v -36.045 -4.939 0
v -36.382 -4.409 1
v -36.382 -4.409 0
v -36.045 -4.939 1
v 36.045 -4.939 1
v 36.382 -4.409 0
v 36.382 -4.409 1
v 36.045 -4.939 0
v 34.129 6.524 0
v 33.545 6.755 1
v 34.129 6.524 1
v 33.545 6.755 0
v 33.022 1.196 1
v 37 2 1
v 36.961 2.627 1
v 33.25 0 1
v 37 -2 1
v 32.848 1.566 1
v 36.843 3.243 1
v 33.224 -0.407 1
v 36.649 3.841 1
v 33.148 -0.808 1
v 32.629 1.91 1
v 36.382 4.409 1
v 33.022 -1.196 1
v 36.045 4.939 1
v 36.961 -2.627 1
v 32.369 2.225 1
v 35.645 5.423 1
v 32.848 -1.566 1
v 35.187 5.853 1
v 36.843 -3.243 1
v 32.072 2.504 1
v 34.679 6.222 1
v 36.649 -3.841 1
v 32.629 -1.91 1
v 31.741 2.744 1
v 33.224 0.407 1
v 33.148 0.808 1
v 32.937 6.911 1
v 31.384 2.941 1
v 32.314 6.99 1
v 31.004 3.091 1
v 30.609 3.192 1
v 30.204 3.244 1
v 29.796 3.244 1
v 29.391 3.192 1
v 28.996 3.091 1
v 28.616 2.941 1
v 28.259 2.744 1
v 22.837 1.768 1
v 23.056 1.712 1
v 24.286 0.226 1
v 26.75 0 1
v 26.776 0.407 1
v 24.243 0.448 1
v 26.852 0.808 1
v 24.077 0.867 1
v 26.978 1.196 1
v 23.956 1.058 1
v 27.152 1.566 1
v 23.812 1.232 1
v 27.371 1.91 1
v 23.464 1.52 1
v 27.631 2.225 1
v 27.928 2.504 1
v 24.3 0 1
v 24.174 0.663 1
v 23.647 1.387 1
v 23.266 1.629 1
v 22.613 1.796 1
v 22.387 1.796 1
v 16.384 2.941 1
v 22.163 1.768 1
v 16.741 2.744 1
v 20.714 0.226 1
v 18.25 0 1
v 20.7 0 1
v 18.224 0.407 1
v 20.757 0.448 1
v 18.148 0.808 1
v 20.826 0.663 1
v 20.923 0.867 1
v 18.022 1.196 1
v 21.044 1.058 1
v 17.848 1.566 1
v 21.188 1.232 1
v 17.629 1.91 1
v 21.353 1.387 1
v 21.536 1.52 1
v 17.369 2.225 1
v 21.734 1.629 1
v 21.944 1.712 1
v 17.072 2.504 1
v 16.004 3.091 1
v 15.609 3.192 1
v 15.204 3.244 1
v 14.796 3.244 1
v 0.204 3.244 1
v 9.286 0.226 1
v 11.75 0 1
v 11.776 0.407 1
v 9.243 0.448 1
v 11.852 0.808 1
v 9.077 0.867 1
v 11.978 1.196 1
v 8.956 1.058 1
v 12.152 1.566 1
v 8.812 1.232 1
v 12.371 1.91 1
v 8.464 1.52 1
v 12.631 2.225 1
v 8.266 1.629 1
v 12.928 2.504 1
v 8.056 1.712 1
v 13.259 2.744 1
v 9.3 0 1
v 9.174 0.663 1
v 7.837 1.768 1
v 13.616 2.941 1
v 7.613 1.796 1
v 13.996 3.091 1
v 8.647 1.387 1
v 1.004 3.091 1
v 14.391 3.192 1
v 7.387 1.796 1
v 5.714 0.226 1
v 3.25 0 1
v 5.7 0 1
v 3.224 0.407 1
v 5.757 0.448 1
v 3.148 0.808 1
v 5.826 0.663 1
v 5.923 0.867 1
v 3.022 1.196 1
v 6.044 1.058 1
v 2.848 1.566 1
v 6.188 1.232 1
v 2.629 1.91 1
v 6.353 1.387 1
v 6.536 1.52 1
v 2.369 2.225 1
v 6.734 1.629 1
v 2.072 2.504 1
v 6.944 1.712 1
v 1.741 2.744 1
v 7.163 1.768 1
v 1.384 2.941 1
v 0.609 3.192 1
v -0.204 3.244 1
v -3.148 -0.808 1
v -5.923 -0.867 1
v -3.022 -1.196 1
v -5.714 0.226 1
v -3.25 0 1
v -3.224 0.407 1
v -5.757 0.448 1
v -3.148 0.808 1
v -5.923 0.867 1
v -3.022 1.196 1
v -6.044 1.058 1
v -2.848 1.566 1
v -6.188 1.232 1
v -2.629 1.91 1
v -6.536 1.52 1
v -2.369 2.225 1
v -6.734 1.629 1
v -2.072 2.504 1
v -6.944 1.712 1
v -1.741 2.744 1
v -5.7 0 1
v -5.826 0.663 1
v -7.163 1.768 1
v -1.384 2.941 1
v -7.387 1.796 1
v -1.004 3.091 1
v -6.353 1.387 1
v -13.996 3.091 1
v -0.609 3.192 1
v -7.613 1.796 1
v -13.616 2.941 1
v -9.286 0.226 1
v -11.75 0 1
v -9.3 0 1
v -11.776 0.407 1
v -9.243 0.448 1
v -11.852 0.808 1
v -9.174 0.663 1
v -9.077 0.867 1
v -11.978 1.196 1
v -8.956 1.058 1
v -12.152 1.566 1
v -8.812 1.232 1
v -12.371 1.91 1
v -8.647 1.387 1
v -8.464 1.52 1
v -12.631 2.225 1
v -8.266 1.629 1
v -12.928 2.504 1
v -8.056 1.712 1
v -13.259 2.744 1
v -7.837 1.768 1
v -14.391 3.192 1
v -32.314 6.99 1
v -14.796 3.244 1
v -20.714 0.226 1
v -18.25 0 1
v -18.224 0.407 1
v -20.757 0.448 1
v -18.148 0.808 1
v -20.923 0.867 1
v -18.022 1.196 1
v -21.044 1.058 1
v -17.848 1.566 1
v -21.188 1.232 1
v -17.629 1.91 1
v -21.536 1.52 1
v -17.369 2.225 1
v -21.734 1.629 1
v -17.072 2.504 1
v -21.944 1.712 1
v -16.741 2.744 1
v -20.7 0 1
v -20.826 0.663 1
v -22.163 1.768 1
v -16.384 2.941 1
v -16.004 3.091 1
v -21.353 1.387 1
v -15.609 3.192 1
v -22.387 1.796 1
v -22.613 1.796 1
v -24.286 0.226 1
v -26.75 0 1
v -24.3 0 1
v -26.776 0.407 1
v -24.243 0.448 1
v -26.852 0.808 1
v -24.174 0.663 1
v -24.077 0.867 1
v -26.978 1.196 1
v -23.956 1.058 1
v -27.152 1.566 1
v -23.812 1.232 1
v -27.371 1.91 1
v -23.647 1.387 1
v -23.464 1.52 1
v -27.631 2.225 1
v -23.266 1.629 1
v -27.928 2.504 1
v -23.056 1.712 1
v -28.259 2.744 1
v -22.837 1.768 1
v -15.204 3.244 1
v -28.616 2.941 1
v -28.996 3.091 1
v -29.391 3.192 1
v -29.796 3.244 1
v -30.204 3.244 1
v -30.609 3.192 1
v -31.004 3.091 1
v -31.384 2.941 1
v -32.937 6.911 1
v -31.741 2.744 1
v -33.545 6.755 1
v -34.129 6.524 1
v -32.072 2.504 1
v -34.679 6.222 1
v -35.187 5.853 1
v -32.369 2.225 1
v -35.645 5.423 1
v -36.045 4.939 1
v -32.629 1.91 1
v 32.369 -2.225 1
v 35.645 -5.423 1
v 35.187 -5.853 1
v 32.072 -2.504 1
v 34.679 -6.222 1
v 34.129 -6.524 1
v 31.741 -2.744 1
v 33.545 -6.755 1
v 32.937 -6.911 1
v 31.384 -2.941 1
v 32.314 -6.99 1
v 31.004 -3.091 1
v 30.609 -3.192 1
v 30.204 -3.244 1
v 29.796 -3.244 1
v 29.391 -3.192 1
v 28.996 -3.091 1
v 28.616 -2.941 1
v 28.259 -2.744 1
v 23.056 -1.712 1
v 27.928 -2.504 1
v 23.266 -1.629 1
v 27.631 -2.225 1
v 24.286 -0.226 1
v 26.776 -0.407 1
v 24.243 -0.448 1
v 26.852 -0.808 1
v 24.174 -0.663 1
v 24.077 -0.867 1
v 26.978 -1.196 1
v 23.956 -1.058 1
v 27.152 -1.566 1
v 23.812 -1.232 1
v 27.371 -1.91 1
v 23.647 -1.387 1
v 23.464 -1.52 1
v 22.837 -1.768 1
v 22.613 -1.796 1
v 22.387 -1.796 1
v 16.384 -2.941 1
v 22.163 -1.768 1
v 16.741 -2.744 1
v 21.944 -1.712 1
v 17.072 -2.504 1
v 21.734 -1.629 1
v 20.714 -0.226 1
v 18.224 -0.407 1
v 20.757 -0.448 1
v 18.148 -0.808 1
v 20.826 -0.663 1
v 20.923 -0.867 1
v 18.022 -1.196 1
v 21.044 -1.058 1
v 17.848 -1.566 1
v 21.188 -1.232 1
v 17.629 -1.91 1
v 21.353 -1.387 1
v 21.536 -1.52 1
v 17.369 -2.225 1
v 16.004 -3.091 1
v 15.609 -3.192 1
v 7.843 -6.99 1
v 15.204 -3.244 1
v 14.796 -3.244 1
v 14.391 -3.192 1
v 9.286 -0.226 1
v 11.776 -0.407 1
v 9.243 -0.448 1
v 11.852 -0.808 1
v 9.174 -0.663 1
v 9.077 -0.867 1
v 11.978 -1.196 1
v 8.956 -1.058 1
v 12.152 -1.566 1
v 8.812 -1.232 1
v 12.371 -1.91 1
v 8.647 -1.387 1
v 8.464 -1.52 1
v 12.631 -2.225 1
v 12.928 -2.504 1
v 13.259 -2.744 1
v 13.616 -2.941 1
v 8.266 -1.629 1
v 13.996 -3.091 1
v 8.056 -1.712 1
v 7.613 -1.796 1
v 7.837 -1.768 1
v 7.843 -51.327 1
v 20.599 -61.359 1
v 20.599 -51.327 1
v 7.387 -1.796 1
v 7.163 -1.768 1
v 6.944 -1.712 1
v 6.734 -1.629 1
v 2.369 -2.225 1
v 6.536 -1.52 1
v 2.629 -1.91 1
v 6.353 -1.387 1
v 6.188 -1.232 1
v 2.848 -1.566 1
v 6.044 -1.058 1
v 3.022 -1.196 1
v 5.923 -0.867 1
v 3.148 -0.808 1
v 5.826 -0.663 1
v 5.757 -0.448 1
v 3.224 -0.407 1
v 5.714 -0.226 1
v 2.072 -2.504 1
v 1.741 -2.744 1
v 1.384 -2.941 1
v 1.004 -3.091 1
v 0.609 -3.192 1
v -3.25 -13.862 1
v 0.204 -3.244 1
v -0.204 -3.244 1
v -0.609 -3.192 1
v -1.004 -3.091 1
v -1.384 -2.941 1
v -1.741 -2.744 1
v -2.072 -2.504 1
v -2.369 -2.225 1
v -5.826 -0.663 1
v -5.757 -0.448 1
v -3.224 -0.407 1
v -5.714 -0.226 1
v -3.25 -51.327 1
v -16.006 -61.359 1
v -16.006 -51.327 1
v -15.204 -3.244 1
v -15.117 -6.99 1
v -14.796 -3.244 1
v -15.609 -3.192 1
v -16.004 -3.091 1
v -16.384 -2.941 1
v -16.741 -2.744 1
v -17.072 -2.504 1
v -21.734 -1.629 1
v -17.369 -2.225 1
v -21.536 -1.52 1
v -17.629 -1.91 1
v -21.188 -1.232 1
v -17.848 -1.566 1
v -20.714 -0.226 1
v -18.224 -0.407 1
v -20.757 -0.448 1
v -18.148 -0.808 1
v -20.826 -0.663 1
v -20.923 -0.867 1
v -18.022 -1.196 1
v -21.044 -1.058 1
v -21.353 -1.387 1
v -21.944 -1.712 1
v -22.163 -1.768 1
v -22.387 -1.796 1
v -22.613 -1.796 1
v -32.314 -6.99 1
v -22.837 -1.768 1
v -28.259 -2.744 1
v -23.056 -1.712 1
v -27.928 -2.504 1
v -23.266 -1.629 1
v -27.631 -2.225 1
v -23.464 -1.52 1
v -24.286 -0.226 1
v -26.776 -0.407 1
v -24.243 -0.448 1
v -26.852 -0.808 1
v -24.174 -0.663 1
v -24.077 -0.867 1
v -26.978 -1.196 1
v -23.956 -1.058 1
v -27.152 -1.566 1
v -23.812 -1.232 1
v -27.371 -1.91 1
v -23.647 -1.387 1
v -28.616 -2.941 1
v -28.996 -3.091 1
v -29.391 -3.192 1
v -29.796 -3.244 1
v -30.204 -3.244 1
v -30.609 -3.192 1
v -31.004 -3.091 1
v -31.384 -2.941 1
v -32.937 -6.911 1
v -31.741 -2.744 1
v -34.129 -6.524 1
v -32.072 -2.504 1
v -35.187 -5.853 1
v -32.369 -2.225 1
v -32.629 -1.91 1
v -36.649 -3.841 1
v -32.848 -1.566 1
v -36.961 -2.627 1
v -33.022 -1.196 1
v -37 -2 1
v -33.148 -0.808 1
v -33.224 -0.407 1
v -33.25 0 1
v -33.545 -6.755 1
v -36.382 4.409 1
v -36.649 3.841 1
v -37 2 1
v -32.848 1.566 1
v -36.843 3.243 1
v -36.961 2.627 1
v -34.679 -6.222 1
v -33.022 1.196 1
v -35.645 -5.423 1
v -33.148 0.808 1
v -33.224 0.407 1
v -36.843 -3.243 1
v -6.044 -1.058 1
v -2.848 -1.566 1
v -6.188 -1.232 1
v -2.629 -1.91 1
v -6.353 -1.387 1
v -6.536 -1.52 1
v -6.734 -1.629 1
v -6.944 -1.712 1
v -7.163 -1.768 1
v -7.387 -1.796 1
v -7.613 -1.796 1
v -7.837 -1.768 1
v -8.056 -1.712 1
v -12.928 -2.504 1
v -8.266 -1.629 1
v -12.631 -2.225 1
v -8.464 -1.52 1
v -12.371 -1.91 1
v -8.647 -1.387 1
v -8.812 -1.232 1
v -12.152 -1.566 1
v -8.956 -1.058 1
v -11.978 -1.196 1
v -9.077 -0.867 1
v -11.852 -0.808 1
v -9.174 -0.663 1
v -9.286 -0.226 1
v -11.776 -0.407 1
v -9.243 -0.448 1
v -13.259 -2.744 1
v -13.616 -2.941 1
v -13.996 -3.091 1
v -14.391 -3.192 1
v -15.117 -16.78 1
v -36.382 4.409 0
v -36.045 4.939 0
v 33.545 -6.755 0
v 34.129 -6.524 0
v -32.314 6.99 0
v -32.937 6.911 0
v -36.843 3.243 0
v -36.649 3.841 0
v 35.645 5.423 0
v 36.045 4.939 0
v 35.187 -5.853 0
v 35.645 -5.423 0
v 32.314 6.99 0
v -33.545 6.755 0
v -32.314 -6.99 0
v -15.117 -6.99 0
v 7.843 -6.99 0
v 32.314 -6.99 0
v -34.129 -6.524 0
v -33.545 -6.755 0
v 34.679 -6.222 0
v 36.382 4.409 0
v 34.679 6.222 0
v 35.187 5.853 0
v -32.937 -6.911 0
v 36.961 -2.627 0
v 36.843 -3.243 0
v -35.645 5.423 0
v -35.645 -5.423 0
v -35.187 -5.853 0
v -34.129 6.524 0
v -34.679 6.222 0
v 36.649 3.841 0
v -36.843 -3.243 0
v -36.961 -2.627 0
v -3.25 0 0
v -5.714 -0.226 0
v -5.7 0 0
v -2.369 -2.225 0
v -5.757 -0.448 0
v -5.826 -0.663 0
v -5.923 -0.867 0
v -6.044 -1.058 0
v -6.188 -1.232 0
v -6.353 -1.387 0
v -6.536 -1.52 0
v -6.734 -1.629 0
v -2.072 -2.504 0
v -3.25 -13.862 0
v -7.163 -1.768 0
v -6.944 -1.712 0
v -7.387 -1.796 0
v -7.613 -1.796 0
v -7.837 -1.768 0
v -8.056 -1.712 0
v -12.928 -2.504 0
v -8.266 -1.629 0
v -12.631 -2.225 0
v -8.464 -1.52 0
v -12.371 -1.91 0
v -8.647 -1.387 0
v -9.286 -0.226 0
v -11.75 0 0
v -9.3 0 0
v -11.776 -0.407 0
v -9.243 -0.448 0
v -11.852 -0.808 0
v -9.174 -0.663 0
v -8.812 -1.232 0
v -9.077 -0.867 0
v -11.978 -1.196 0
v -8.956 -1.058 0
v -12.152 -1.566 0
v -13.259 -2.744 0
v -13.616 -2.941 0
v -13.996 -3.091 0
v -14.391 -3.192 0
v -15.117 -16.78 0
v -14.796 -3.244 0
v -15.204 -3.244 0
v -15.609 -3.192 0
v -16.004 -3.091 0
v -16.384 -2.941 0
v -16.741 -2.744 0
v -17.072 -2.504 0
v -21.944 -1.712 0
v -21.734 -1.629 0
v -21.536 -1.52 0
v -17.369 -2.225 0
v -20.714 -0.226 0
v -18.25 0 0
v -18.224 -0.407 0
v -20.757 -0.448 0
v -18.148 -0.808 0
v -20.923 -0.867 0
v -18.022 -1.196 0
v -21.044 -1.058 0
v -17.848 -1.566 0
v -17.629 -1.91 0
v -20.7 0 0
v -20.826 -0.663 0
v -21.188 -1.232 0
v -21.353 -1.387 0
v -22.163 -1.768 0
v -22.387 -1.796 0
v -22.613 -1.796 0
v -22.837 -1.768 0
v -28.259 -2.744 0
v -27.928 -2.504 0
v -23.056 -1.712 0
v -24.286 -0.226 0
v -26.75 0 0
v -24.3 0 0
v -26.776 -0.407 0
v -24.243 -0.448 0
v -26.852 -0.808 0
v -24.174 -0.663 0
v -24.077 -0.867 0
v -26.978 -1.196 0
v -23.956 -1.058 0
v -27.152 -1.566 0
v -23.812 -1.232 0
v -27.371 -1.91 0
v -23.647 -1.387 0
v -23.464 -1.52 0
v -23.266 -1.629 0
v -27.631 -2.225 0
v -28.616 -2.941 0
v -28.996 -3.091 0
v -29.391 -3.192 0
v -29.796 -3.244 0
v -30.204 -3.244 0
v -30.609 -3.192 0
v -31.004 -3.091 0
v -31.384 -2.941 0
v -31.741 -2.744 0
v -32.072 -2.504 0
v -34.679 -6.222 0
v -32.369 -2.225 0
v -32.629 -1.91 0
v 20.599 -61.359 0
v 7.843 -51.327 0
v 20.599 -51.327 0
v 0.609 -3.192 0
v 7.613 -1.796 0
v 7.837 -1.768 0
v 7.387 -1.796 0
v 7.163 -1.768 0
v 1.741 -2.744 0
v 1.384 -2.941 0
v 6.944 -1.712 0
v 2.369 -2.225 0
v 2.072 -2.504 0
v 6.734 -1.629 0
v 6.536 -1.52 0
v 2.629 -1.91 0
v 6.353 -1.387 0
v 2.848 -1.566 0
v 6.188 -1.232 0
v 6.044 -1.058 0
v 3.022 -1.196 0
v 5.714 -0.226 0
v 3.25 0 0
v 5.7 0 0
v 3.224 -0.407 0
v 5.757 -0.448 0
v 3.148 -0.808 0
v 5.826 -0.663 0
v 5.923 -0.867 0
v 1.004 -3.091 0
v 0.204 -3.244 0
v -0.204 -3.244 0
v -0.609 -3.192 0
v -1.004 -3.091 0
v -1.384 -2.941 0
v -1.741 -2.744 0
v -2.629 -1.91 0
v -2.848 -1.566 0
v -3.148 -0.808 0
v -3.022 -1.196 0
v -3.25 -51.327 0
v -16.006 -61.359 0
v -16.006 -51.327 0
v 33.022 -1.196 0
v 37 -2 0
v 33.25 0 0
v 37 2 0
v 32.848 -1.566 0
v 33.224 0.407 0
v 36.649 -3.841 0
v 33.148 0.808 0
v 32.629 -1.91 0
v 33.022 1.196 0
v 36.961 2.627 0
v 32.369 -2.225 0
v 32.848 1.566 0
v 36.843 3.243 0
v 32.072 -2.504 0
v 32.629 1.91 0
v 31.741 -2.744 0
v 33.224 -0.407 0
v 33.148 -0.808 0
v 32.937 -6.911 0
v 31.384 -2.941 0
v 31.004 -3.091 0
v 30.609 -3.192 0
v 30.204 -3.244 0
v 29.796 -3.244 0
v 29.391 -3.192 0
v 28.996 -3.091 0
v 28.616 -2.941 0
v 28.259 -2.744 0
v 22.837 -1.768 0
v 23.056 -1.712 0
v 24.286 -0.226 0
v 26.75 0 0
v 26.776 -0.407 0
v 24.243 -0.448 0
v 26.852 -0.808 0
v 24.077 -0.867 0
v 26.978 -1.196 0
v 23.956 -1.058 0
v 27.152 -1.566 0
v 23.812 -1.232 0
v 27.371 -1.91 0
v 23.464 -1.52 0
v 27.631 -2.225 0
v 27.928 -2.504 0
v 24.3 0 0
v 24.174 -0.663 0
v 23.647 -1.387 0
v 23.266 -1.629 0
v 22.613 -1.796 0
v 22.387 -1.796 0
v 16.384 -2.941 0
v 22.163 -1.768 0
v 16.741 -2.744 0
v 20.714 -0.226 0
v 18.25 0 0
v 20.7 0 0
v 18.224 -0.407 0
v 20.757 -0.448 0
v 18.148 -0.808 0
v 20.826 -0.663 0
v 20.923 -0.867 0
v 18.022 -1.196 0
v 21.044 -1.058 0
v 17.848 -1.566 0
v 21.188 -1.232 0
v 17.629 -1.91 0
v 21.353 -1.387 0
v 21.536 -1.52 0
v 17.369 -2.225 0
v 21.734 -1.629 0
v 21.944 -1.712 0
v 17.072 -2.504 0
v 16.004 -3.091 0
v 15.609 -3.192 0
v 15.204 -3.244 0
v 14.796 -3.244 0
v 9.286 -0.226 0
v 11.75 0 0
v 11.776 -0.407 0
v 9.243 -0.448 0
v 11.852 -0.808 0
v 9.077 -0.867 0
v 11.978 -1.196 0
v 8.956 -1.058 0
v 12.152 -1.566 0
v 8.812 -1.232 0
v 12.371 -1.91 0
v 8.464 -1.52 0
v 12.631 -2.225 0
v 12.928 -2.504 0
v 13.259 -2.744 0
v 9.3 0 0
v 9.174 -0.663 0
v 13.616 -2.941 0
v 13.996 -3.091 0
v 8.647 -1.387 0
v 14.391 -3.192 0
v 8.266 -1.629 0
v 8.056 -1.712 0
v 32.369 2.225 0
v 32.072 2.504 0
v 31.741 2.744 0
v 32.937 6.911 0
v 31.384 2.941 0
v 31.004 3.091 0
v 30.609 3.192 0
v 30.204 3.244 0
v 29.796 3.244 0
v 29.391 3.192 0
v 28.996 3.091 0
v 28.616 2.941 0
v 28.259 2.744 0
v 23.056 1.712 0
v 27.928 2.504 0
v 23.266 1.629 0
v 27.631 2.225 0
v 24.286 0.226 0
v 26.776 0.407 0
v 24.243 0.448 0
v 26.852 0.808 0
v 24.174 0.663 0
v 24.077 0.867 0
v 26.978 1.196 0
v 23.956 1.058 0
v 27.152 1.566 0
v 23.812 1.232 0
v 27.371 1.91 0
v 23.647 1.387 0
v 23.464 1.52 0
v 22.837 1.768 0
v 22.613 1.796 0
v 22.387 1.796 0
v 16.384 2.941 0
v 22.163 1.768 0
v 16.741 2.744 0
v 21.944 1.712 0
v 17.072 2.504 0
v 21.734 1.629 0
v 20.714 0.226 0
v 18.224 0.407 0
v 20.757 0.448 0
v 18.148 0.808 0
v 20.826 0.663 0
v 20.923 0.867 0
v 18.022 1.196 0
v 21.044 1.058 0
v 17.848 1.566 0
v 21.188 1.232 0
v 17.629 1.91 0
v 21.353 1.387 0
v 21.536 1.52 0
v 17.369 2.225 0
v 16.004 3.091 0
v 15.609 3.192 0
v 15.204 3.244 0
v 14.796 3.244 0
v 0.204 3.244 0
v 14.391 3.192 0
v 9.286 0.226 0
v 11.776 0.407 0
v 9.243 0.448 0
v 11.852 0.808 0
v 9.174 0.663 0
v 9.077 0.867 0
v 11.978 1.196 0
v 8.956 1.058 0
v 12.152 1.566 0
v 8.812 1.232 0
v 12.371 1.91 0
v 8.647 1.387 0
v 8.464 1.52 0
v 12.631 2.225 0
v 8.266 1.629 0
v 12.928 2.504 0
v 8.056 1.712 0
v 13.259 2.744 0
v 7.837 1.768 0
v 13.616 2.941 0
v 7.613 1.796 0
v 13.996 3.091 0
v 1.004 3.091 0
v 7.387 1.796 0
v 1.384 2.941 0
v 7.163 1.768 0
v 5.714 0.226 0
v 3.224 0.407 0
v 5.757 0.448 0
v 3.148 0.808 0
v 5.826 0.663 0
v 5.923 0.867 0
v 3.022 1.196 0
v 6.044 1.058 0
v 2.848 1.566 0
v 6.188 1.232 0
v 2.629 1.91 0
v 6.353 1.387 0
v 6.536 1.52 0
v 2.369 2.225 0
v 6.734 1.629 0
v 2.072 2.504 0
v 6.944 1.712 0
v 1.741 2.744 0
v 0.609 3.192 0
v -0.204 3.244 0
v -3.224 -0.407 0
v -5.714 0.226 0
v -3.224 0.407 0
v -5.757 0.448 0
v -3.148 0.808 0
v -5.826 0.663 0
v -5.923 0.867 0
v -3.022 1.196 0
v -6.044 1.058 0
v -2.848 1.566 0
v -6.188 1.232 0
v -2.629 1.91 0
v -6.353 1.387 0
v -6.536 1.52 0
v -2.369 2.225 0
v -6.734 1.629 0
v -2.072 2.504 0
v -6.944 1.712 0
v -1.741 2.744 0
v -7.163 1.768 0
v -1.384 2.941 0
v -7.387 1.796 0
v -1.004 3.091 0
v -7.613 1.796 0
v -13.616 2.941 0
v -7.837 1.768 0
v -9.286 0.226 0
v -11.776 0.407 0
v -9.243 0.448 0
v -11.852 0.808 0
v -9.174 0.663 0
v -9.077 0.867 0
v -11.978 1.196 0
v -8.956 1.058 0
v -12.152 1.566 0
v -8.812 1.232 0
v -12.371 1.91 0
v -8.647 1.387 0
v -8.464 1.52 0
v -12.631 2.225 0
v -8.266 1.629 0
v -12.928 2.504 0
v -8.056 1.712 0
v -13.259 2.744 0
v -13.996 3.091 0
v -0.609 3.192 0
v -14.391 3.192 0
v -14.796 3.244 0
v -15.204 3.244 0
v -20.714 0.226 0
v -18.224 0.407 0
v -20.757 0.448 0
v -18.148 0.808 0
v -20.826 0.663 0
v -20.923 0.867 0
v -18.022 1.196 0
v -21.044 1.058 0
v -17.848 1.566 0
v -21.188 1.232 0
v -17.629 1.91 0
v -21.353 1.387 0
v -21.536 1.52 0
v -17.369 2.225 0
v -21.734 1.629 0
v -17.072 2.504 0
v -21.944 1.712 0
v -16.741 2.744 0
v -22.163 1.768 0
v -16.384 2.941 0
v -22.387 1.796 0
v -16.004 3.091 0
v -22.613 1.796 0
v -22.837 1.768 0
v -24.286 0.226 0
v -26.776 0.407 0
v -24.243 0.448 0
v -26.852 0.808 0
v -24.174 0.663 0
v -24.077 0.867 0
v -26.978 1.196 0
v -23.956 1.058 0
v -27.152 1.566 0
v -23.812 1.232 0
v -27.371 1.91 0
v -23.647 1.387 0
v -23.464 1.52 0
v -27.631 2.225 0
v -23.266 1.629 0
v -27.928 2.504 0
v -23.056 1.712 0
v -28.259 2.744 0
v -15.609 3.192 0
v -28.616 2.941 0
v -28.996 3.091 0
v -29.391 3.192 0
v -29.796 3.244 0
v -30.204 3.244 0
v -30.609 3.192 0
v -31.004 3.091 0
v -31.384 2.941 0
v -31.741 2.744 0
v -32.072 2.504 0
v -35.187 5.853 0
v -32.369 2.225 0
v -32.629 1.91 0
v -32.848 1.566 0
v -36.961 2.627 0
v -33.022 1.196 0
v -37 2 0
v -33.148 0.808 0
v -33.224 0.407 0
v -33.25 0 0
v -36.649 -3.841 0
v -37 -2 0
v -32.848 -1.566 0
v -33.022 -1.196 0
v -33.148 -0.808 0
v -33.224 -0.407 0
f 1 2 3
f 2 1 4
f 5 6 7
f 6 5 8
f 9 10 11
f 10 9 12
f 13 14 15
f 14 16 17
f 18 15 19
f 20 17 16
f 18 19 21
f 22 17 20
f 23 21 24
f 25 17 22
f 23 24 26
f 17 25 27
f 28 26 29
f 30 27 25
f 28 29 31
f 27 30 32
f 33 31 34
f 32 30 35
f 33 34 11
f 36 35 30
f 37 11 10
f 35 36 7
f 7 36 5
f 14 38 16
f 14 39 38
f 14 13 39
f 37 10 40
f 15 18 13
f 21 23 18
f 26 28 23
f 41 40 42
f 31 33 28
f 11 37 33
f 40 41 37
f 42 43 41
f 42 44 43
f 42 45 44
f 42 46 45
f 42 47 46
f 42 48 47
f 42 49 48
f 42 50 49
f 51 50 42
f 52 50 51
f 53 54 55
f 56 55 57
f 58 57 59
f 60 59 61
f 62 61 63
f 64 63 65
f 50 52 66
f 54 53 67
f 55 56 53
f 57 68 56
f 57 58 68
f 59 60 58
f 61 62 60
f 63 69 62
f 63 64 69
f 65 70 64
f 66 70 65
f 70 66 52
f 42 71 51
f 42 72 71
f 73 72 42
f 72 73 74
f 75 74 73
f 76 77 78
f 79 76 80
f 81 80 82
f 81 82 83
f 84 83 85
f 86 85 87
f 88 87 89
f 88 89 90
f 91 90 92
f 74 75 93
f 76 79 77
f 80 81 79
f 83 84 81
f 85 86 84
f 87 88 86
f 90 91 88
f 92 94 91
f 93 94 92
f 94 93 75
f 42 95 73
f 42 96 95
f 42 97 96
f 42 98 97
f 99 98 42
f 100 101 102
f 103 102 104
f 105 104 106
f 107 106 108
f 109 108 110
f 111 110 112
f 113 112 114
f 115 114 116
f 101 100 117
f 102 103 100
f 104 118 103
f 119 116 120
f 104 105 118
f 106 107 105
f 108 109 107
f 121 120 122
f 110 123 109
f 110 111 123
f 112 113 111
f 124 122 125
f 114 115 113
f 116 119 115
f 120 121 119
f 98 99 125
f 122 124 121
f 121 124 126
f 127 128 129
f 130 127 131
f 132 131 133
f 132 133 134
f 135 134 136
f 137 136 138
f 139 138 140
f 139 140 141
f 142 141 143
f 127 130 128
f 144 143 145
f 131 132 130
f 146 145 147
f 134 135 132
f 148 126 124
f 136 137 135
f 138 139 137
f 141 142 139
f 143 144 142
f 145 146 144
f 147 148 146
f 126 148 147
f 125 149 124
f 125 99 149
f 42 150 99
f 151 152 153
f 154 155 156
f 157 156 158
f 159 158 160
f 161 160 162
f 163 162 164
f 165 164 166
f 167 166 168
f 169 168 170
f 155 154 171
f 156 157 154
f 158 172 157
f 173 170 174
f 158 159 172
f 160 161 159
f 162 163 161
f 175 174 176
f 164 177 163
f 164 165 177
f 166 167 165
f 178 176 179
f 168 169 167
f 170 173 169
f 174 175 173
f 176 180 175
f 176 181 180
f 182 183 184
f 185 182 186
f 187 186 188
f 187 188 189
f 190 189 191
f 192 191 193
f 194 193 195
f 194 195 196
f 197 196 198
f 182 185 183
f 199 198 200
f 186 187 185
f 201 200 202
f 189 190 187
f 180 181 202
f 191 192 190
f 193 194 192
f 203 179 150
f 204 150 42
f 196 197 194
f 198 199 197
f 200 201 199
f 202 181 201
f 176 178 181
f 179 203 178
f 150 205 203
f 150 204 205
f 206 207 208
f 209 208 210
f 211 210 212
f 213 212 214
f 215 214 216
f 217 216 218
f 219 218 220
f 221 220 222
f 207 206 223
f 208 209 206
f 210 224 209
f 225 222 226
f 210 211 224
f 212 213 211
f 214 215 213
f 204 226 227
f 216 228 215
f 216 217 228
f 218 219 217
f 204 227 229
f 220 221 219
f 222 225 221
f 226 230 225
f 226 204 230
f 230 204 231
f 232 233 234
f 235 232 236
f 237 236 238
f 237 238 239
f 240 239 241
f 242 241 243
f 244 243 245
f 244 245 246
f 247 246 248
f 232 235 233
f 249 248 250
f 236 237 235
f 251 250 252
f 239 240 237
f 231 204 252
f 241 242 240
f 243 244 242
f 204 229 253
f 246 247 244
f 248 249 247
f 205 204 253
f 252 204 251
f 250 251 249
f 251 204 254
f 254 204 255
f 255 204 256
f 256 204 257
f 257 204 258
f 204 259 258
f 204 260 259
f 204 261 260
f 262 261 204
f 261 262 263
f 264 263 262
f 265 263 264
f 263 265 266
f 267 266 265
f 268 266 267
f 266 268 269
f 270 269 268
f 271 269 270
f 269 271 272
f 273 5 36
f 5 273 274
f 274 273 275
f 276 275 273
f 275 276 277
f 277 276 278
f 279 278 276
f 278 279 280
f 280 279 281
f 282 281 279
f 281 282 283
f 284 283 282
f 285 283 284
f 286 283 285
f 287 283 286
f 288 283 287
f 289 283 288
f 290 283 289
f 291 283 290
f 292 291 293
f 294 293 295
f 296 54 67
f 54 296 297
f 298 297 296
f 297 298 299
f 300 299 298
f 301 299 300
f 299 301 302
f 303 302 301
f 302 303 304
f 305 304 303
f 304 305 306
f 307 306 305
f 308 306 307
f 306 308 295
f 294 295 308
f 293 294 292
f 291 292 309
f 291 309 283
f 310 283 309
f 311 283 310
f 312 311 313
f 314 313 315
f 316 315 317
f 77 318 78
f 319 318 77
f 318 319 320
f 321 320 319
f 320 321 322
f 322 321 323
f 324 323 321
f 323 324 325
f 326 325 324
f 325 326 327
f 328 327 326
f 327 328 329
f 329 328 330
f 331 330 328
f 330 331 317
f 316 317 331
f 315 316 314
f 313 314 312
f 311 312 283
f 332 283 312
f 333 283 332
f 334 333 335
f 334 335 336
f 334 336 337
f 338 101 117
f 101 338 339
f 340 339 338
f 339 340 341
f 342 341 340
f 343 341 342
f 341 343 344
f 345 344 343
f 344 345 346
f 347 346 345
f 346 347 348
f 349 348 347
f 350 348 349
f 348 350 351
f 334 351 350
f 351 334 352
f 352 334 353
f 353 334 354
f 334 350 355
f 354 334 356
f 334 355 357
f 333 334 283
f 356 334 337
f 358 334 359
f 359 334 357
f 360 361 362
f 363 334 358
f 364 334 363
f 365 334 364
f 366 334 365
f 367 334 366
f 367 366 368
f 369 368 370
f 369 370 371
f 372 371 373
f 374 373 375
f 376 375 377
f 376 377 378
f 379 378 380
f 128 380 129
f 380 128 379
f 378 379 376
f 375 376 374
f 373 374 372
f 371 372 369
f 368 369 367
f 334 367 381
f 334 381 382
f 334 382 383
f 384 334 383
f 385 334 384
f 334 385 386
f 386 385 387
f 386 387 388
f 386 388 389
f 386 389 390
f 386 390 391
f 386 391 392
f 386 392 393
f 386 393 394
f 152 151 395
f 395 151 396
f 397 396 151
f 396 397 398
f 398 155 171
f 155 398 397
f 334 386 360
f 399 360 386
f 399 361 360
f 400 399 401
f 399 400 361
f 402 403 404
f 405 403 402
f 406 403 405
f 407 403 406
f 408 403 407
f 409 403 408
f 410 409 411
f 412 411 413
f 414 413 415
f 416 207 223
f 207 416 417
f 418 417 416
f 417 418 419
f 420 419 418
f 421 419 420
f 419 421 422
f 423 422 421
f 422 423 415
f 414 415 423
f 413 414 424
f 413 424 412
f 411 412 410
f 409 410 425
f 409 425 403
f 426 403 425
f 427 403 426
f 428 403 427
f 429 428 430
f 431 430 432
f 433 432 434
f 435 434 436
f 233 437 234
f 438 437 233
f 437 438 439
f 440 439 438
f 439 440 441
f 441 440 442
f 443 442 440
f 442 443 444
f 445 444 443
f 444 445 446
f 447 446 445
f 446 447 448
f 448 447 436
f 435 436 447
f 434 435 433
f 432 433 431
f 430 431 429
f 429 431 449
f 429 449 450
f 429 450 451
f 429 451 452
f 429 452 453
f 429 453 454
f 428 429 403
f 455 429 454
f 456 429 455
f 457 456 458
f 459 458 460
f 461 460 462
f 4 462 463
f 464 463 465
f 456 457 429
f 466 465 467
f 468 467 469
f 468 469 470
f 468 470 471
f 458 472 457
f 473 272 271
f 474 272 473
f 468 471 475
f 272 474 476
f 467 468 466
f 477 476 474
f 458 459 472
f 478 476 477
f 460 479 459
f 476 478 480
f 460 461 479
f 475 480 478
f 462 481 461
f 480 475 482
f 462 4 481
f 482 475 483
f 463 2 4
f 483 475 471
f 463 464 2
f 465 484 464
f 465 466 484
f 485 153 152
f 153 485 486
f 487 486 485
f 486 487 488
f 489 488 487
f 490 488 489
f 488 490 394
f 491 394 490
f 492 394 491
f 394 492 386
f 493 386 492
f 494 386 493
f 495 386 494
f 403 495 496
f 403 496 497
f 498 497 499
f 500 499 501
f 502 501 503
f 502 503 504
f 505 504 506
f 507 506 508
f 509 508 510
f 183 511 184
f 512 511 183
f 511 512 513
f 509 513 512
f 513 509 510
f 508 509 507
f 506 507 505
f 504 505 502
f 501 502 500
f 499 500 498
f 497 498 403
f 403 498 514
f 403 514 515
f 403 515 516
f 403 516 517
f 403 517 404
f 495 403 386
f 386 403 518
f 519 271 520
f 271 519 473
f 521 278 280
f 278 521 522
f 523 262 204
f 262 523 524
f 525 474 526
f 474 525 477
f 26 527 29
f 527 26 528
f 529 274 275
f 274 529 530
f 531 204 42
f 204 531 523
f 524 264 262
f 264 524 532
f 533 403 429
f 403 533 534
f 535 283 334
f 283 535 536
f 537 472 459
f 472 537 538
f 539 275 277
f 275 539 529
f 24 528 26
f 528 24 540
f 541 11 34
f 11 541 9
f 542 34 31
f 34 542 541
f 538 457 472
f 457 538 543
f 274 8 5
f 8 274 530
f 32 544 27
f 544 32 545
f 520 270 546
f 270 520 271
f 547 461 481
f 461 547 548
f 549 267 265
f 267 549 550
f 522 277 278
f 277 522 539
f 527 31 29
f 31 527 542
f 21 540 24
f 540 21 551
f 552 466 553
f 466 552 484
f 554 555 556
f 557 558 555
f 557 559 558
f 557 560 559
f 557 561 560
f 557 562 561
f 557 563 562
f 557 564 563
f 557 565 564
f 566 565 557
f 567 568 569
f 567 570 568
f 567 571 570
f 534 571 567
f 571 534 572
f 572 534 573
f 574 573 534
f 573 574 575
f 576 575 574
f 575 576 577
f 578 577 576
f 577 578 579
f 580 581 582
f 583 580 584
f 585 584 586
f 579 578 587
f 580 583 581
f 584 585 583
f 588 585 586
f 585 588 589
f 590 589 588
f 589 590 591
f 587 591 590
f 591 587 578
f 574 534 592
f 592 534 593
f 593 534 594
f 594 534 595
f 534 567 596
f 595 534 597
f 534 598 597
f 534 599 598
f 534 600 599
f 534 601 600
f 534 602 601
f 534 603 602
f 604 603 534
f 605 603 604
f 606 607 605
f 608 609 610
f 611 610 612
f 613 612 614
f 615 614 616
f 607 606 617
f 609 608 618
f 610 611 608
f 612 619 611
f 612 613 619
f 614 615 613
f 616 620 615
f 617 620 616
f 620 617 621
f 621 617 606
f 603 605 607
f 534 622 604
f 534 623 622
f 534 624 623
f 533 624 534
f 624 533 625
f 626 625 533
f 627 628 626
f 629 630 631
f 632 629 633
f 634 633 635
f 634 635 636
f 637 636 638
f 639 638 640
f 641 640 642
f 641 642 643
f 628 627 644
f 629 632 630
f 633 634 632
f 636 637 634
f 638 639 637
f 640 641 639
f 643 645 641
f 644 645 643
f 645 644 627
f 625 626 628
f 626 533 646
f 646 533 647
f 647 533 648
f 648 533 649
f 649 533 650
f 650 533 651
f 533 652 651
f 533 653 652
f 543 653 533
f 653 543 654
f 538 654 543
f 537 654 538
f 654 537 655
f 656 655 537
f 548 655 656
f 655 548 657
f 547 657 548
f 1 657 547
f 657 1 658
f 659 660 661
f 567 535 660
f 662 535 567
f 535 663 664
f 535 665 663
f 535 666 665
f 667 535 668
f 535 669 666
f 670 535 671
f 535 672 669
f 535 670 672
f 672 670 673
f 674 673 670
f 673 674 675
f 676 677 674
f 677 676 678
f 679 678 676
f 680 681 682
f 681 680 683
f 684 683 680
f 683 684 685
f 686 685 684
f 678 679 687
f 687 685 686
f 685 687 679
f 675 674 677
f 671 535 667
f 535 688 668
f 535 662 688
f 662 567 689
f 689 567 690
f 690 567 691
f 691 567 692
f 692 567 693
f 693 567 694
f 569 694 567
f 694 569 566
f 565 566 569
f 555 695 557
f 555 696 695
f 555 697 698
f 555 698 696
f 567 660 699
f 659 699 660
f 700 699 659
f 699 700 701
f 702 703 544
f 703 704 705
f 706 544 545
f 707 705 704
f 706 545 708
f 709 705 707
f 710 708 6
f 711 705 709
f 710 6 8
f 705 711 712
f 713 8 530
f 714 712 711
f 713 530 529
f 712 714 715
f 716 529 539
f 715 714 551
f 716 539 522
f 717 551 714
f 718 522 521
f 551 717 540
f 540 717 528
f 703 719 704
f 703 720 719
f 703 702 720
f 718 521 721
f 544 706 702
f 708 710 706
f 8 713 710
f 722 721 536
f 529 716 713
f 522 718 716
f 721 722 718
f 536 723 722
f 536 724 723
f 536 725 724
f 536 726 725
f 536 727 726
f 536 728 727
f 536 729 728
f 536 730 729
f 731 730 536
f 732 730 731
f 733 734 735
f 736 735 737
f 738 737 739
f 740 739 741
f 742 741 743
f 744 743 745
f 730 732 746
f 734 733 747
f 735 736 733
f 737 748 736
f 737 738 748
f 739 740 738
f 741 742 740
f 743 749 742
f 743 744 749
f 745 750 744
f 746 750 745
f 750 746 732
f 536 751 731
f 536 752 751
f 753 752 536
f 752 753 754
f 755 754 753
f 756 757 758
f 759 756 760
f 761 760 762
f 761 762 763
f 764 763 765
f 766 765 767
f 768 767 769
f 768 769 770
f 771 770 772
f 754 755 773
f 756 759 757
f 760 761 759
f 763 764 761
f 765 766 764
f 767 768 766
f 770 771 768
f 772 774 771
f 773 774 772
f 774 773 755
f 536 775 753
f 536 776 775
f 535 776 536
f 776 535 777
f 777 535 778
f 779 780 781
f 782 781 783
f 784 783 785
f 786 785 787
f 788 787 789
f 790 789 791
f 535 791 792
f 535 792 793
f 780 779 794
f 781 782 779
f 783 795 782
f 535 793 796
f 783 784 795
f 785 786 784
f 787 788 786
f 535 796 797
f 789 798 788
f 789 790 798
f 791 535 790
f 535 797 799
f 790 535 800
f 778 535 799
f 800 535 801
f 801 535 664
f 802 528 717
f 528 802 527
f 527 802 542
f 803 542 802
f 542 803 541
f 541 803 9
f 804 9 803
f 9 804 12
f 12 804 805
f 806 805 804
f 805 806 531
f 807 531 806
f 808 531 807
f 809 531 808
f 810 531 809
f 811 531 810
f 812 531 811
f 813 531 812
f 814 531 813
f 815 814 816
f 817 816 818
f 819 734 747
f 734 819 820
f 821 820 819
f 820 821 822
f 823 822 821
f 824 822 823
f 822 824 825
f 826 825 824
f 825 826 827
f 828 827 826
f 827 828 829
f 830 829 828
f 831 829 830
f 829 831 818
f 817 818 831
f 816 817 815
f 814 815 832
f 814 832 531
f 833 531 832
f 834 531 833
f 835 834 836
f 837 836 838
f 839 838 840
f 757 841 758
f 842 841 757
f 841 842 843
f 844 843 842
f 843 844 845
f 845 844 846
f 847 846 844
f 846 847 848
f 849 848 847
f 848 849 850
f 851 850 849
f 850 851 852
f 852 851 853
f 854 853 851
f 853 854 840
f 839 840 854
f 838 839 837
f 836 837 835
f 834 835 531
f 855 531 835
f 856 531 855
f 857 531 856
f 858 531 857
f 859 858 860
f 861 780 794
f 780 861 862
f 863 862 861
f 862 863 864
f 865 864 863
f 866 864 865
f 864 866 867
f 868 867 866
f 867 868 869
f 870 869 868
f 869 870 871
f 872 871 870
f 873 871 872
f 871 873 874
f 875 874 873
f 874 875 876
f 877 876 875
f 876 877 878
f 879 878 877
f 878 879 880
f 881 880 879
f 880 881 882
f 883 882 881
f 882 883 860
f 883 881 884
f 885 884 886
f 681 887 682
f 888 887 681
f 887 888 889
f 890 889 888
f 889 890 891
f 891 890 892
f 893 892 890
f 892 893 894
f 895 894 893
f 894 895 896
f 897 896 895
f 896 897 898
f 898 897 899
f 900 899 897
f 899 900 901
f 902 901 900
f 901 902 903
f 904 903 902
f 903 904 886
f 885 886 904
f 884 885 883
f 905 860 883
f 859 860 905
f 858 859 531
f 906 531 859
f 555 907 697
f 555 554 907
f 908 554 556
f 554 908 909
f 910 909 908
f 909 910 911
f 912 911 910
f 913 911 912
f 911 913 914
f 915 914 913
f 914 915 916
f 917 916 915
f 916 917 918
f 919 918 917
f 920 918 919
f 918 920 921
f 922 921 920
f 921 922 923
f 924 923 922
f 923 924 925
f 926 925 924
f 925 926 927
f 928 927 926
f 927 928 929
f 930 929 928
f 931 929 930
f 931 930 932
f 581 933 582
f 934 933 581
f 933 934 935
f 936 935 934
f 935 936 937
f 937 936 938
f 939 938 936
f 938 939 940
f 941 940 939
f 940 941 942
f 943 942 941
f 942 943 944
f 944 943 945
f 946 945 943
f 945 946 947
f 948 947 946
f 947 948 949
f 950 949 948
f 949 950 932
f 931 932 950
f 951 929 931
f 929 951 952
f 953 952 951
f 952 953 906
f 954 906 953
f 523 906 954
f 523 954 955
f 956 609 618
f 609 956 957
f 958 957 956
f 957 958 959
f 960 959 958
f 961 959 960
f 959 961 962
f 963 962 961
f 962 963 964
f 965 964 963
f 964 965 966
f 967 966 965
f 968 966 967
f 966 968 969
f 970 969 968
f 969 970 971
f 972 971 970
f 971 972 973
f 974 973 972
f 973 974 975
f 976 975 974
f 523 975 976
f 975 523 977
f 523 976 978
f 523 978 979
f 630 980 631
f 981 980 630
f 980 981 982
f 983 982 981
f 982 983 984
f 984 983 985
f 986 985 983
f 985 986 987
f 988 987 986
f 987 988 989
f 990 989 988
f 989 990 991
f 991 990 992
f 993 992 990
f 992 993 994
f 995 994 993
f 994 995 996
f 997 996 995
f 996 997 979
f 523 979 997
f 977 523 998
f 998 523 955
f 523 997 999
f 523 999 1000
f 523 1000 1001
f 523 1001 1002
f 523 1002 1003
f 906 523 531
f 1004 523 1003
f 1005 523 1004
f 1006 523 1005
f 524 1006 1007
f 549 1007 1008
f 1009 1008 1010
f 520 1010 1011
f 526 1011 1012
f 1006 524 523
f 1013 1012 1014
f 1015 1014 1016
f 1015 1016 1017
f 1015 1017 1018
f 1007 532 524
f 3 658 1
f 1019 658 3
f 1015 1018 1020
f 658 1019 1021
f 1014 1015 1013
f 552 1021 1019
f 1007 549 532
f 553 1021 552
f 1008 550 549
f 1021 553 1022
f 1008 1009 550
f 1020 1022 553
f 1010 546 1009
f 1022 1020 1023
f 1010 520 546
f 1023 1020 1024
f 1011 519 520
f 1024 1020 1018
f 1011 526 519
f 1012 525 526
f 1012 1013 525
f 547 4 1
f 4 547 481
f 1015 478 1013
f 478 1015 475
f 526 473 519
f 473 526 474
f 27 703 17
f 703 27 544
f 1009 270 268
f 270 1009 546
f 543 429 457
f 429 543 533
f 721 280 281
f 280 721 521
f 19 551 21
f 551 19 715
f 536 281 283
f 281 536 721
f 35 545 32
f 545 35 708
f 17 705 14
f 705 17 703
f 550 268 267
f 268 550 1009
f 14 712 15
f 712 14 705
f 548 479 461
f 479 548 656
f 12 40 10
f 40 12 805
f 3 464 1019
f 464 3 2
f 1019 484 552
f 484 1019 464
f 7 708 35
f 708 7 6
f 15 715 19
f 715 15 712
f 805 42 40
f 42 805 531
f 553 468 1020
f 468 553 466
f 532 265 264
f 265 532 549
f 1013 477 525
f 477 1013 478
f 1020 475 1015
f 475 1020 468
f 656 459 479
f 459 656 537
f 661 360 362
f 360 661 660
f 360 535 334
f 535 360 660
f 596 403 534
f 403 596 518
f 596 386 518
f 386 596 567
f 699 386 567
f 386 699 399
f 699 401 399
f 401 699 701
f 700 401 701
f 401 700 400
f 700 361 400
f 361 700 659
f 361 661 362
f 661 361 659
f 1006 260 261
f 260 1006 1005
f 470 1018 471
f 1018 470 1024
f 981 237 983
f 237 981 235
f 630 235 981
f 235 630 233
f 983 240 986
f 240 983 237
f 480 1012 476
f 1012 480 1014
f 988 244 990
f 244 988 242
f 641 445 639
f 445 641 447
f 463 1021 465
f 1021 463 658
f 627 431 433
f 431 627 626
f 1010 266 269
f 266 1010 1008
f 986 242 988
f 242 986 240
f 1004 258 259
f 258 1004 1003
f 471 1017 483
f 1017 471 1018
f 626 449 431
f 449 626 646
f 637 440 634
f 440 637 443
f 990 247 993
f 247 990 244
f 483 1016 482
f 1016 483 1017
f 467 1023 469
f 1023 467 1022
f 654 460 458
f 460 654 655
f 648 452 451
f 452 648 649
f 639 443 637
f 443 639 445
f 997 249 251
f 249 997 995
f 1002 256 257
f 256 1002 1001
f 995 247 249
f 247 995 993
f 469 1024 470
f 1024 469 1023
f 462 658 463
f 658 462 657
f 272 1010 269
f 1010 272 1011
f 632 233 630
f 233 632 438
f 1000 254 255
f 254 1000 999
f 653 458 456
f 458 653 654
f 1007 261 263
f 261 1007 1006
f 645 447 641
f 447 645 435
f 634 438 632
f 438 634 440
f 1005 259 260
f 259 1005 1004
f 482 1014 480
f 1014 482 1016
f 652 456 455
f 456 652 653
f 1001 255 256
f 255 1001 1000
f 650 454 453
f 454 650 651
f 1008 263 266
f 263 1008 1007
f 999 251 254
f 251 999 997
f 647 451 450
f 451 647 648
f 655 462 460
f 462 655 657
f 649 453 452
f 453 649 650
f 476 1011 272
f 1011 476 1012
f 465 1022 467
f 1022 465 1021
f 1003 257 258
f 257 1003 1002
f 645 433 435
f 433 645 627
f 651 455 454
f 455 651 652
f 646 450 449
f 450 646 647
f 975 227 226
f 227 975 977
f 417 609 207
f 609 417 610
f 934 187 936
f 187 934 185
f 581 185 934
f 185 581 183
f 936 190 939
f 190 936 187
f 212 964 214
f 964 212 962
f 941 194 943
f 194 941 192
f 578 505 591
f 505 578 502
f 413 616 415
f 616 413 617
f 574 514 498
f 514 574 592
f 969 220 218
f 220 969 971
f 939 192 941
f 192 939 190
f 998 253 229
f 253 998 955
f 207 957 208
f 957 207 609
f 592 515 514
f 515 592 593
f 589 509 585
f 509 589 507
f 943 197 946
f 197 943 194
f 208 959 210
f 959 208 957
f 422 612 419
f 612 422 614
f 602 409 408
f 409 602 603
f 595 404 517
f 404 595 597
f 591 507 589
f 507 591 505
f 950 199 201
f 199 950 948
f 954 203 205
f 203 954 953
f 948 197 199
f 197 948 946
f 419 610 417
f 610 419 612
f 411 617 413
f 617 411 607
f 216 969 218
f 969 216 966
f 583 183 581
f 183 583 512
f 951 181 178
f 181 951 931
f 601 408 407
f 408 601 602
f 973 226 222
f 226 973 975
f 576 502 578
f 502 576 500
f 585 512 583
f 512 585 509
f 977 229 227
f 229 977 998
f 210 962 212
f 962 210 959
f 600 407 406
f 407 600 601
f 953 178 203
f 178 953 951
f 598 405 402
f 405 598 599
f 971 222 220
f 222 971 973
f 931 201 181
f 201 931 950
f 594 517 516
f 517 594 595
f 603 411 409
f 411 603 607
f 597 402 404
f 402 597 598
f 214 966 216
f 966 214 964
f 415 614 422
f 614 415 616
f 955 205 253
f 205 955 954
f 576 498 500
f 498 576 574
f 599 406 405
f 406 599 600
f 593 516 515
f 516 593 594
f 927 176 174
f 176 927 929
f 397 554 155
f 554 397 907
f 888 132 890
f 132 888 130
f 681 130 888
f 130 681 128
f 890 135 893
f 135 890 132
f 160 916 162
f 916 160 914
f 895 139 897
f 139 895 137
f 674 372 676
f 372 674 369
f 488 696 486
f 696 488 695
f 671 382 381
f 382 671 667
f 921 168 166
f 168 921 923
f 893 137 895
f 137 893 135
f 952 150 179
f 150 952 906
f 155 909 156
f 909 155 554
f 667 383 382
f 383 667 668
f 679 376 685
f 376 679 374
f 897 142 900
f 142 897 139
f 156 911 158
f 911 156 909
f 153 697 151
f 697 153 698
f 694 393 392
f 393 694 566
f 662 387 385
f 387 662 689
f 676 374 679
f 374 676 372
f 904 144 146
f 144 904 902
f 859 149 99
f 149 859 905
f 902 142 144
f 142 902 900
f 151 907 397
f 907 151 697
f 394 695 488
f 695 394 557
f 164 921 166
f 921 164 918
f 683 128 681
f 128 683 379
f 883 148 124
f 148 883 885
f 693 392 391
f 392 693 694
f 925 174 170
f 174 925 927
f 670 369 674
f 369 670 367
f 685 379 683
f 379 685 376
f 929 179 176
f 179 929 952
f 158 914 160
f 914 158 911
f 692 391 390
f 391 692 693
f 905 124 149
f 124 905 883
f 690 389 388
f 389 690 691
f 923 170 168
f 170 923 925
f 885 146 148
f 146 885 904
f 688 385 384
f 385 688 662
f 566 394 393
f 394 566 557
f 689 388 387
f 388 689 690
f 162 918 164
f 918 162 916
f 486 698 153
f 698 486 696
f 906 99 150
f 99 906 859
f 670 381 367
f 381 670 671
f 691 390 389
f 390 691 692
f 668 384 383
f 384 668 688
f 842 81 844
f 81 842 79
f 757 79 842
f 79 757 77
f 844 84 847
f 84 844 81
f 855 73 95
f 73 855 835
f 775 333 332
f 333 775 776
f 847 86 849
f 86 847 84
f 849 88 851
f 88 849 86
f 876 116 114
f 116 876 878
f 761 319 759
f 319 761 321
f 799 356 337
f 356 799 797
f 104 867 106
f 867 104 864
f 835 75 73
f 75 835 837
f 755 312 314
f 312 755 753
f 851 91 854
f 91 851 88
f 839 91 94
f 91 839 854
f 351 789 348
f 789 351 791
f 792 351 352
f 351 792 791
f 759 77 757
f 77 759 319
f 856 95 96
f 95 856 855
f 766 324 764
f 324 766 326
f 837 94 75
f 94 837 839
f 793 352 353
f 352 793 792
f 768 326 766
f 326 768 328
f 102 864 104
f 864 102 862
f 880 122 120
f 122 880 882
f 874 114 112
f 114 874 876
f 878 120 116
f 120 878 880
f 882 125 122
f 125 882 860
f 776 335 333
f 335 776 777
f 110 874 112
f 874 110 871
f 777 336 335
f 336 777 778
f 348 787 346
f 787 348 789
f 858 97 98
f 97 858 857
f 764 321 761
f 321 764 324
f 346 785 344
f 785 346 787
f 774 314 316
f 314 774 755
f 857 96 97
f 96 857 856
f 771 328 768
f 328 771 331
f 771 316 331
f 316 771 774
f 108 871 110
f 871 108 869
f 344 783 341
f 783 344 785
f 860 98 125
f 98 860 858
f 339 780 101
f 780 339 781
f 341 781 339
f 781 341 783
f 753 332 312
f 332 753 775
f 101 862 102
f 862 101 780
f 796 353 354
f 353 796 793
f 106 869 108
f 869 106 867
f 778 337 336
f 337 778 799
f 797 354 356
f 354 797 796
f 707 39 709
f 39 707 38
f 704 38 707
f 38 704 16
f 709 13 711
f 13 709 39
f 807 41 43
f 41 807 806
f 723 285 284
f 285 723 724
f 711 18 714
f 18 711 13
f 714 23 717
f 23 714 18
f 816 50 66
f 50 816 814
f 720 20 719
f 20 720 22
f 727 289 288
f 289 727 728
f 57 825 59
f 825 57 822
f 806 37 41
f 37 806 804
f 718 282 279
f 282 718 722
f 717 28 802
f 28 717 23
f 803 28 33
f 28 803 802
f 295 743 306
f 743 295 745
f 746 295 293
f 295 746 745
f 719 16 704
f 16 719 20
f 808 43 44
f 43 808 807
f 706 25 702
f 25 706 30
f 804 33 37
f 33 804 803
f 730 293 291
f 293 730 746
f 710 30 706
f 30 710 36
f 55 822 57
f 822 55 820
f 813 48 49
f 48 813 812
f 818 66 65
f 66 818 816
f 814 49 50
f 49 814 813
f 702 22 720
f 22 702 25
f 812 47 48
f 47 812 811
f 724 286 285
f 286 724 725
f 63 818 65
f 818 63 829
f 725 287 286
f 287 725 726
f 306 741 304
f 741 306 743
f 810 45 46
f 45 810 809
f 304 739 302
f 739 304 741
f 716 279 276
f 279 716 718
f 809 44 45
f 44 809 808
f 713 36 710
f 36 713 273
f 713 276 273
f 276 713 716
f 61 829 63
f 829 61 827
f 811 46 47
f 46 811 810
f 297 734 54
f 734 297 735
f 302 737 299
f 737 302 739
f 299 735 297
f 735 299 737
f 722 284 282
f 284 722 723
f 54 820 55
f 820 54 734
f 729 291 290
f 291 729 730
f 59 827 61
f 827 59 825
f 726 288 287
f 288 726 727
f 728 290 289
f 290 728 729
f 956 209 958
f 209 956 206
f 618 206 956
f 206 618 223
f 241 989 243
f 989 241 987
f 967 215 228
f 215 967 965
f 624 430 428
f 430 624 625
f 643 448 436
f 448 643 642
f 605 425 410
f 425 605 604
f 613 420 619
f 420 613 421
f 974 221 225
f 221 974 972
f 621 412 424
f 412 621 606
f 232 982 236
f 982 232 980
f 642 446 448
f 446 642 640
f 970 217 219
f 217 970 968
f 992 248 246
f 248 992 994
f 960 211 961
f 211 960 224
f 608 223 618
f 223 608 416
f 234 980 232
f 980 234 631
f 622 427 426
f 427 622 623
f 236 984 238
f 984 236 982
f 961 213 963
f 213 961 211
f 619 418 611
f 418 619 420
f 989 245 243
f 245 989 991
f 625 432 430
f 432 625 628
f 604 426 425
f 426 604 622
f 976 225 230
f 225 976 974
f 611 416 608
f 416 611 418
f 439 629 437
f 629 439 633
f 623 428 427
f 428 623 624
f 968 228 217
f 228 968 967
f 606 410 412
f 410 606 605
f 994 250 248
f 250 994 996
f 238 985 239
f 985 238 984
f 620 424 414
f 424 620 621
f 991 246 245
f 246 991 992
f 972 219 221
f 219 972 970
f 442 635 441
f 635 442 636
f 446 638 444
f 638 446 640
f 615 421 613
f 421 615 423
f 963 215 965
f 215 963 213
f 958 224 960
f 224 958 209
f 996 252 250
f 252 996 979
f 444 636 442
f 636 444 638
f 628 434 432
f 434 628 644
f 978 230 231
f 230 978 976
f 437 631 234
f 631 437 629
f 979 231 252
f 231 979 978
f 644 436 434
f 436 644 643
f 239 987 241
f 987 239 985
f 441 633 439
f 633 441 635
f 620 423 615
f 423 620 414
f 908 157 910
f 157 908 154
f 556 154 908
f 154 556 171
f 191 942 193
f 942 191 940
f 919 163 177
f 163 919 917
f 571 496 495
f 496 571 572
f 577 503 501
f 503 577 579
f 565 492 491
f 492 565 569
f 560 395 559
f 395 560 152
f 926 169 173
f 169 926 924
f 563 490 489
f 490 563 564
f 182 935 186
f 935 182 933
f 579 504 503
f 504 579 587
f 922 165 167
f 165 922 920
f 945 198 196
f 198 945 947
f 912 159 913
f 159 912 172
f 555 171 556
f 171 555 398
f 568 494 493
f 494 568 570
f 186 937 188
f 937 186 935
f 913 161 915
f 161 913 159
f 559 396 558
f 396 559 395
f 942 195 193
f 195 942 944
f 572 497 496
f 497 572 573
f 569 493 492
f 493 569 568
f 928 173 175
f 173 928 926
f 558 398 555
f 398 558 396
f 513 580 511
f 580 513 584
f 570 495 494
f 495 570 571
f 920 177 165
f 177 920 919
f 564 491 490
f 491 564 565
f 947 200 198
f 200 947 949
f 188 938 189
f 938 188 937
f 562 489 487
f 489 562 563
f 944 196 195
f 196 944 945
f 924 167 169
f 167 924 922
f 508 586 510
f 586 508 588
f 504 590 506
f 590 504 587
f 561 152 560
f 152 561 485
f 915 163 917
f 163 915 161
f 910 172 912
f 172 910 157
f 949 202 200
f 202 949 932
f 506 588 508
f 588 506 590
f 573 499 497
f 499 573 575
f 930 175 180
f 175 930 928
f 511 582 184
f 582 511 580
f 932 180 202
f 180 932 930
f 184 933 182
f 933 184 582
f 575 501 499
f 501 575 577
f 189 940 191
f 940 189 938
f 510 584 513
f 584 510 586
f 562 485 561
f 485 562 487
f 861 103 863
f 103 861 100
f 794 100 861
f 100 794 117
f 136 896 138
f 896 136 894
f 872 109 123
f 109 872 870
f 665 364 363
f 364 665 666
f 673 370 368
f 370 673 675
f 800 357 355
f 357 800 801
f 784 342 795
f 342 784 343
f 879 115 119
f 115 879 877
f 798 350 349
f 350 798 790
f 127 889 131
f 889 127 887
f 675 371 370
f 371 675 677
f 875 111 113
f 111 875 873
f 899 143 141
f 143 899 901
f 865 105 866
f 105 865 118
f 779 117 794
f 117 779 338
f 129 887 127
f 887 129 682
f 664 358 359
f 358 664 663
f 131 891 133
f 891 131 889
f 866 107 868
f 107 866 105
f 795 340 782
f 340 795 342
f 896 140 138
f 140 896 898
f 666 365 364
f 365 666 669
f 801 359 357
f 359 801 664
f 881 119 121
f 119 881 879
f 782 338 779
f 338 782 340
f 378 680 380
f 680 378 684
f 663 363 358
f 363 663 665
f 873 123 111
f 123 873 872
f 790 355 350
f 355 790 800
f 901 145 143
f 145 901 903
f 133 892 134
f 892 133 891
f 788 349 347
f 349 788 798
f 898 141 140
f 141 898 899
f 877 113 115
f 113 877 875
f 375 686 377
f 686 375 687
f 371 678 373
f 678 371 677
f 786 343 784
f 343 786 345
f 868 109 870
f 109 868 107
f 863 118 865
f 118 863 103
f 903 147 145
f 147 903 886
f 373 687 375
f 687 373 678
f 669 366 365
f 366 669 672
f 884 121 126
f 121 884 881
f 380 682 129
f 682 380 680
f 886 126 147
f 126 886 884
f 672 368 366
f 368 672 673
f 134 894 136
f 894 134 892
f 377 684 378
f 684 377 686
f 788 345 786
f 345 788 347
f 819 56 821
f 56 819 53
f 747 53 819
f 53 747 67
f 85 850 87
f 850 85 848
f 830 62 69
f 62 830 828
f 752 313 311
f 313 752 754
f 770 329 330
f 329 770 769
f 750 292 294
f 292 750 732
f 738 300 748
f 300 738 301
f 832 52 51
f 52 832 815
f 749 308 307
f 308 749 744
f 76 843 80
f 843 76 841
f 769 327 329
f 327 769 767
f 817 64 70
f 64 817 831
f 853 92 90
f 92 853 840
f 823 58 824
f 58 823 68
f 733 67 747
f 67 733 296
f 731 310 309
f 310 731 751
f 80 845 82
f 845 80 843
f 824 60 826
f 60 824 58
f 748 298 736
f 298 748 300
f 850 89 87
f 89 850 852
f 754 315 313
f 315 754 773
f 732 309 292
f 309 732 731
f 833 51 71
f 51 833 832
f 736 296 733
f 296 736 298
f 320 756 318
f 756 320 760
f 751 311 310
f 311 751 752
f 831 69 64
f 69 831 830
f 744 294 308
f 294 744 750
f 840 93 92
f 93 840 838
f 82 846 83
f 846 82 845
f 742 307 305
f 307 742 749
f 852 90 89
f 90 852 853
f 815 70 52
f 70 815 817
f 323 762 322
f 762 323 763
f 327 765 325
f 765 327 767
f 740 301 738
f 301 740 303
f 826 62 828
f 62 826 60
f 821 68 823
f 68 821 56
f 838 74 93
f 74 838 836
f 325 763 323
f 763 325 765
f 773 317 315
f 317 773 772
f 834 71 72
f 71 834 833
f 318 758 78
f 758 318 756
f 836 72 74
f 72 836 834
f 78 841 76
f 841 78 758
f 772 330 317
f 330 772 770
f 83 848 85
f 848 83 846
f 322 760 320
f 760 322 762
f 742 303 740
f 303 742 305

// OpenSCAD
$fn = 50;


difference() {
	union() {
		*color(alpha = 1.0000000000, c = "gray") {
			translate(v = [0, 14, 0]) {
				linear_extrude(height = 1) {
					text(font = "Arial:style=Bold", halign = "center", size = 4.5000000000, text = "COMMENT description oobb_plate_shape_p_type_1_depth_5_width_1_thickness_1_extra_oobb_size", valign = "center");
				}
			}
		}
		hull() {
			translate(v = [-32.0000000000, 2.0000000000, 0]) {
				cylinder(h = 1, r = 5);
			}
			translate(v = [32.0000000000, 2.0000000000, 0]) {
				cylinder(h = 1, r = 5);
			}
			translate(v = [-32.0000000000, -2.0000000000, 0]) {
				cylinder(h = 1, r = 5);
			}
			translate(v = [32.0000000000, -2.0000000000, 0]) {
				cylinder(h = 1, r = 5);
			}
		}
		translate(v = [0, -5, 0]) {
			linear_extrude(height = 1) {
				text(font = "DejaVu Sans Mono:style=Bold", halign = "center", size = 57.0000000000, text = "1", valign = "top");
			}
		}
	}
	union() {
		*color(alpha = 1.0000000000, c = "gray") {
			translate(v = [0, 14, 0]) {
				linear_extrude(height = 1) {
					text(font = "Arial:style=Bold", halign = "center", size = 4.5000000000, text = "COMMENT description oobb_holes_shape_n_type_5_width_1_thickness_1_extra_oobb_size_1_height_'all'_holes_true_both_holes", valign = "center");
				}
			}
		}
		translate(v = [-30.0000000000, 0.0000000000, 0]) {
			translate(v = [0, 0, -50]) {
				cylinder(h = 100, r = 3.2500000000);
			}
		}
		translate(v = [-15.0000000000, 0.0000000000, 0]) {
			translate(v = [0, 0, -50]) {
				cylinder(h = 100, r = 3.2500000000);
			}
		}
		translate(v = [0, 0, -50]) {
			cylinder(h = 100, r = 3.2500000000);
		}
		translate(v = [15.0000000000, 0.0000000000, 0]) {
			translate(v = [0, 0, -50]) {
				cylinder(h = 100, r = 3.2500000000);
			}
		}
		translate(v = [30.0000000000, 0.0000000000, 0]) {
			translate(v = [0, 0, -50]) {
				cylinder(h = 100, r = 3.2500000000);
			}
		}
		translate(v = [-30.0000000000, 0.0000000000, 0]) {
			translate(v = [0, 0, -50]) {
				cylinder(h = 100, r = 1.8000000000);
			}
		}
		translate(v = [-22.5000000000, 0.0000000000, 0]) {
			translate(v = [0, 0, -50]) {
				cylinder(h = 100, r = 1.8000000000);
			}
		}
		translate(v = [-15.0000000000, 0.0000000000, 0]) {
			translate(v = [0, 0, -50]) {
				cylinder(h = 100, r = 1.8000000000);
			}
		}
		translate(v = [-7.5000000000, 0.0000000000, 0]) {
			translate(v = [0, 0, -50]) {
				cylinder(h = 100, r = 1.8000000000);
			}
		}
		translate(v = [0, 0, -50]) {
			cylinder(h = 100, r = 1.8000000000);
		}
		translate(v = [7.5000000000, 0.0000000000, 0]) {
			translate(v = [0, 0, -50]) {
				cylinder(h = 100, r = 1.8000000000);
			}
		}
		translate(v = [15.0000000000, 0.0000000000, 0]) {
			translate(v = [0, 0, -50]) {
				cylinder(h = 100, r = 1.8000000000);
			}
		}
		translate(v = [22.5000000000, 0.0000000000, 0]) {
			translate(v = [0, 0, -50]) {
				cylinder(h = 100, r = 1.8000000000);
			}
		}
		translate(v = [30.0000000000, 0.0000000000, 0]) {
			translate(v = [0, 0, -50]) {
				cylinder(h = 100, r = 1.8000000000);
			}
		}
	}
}
